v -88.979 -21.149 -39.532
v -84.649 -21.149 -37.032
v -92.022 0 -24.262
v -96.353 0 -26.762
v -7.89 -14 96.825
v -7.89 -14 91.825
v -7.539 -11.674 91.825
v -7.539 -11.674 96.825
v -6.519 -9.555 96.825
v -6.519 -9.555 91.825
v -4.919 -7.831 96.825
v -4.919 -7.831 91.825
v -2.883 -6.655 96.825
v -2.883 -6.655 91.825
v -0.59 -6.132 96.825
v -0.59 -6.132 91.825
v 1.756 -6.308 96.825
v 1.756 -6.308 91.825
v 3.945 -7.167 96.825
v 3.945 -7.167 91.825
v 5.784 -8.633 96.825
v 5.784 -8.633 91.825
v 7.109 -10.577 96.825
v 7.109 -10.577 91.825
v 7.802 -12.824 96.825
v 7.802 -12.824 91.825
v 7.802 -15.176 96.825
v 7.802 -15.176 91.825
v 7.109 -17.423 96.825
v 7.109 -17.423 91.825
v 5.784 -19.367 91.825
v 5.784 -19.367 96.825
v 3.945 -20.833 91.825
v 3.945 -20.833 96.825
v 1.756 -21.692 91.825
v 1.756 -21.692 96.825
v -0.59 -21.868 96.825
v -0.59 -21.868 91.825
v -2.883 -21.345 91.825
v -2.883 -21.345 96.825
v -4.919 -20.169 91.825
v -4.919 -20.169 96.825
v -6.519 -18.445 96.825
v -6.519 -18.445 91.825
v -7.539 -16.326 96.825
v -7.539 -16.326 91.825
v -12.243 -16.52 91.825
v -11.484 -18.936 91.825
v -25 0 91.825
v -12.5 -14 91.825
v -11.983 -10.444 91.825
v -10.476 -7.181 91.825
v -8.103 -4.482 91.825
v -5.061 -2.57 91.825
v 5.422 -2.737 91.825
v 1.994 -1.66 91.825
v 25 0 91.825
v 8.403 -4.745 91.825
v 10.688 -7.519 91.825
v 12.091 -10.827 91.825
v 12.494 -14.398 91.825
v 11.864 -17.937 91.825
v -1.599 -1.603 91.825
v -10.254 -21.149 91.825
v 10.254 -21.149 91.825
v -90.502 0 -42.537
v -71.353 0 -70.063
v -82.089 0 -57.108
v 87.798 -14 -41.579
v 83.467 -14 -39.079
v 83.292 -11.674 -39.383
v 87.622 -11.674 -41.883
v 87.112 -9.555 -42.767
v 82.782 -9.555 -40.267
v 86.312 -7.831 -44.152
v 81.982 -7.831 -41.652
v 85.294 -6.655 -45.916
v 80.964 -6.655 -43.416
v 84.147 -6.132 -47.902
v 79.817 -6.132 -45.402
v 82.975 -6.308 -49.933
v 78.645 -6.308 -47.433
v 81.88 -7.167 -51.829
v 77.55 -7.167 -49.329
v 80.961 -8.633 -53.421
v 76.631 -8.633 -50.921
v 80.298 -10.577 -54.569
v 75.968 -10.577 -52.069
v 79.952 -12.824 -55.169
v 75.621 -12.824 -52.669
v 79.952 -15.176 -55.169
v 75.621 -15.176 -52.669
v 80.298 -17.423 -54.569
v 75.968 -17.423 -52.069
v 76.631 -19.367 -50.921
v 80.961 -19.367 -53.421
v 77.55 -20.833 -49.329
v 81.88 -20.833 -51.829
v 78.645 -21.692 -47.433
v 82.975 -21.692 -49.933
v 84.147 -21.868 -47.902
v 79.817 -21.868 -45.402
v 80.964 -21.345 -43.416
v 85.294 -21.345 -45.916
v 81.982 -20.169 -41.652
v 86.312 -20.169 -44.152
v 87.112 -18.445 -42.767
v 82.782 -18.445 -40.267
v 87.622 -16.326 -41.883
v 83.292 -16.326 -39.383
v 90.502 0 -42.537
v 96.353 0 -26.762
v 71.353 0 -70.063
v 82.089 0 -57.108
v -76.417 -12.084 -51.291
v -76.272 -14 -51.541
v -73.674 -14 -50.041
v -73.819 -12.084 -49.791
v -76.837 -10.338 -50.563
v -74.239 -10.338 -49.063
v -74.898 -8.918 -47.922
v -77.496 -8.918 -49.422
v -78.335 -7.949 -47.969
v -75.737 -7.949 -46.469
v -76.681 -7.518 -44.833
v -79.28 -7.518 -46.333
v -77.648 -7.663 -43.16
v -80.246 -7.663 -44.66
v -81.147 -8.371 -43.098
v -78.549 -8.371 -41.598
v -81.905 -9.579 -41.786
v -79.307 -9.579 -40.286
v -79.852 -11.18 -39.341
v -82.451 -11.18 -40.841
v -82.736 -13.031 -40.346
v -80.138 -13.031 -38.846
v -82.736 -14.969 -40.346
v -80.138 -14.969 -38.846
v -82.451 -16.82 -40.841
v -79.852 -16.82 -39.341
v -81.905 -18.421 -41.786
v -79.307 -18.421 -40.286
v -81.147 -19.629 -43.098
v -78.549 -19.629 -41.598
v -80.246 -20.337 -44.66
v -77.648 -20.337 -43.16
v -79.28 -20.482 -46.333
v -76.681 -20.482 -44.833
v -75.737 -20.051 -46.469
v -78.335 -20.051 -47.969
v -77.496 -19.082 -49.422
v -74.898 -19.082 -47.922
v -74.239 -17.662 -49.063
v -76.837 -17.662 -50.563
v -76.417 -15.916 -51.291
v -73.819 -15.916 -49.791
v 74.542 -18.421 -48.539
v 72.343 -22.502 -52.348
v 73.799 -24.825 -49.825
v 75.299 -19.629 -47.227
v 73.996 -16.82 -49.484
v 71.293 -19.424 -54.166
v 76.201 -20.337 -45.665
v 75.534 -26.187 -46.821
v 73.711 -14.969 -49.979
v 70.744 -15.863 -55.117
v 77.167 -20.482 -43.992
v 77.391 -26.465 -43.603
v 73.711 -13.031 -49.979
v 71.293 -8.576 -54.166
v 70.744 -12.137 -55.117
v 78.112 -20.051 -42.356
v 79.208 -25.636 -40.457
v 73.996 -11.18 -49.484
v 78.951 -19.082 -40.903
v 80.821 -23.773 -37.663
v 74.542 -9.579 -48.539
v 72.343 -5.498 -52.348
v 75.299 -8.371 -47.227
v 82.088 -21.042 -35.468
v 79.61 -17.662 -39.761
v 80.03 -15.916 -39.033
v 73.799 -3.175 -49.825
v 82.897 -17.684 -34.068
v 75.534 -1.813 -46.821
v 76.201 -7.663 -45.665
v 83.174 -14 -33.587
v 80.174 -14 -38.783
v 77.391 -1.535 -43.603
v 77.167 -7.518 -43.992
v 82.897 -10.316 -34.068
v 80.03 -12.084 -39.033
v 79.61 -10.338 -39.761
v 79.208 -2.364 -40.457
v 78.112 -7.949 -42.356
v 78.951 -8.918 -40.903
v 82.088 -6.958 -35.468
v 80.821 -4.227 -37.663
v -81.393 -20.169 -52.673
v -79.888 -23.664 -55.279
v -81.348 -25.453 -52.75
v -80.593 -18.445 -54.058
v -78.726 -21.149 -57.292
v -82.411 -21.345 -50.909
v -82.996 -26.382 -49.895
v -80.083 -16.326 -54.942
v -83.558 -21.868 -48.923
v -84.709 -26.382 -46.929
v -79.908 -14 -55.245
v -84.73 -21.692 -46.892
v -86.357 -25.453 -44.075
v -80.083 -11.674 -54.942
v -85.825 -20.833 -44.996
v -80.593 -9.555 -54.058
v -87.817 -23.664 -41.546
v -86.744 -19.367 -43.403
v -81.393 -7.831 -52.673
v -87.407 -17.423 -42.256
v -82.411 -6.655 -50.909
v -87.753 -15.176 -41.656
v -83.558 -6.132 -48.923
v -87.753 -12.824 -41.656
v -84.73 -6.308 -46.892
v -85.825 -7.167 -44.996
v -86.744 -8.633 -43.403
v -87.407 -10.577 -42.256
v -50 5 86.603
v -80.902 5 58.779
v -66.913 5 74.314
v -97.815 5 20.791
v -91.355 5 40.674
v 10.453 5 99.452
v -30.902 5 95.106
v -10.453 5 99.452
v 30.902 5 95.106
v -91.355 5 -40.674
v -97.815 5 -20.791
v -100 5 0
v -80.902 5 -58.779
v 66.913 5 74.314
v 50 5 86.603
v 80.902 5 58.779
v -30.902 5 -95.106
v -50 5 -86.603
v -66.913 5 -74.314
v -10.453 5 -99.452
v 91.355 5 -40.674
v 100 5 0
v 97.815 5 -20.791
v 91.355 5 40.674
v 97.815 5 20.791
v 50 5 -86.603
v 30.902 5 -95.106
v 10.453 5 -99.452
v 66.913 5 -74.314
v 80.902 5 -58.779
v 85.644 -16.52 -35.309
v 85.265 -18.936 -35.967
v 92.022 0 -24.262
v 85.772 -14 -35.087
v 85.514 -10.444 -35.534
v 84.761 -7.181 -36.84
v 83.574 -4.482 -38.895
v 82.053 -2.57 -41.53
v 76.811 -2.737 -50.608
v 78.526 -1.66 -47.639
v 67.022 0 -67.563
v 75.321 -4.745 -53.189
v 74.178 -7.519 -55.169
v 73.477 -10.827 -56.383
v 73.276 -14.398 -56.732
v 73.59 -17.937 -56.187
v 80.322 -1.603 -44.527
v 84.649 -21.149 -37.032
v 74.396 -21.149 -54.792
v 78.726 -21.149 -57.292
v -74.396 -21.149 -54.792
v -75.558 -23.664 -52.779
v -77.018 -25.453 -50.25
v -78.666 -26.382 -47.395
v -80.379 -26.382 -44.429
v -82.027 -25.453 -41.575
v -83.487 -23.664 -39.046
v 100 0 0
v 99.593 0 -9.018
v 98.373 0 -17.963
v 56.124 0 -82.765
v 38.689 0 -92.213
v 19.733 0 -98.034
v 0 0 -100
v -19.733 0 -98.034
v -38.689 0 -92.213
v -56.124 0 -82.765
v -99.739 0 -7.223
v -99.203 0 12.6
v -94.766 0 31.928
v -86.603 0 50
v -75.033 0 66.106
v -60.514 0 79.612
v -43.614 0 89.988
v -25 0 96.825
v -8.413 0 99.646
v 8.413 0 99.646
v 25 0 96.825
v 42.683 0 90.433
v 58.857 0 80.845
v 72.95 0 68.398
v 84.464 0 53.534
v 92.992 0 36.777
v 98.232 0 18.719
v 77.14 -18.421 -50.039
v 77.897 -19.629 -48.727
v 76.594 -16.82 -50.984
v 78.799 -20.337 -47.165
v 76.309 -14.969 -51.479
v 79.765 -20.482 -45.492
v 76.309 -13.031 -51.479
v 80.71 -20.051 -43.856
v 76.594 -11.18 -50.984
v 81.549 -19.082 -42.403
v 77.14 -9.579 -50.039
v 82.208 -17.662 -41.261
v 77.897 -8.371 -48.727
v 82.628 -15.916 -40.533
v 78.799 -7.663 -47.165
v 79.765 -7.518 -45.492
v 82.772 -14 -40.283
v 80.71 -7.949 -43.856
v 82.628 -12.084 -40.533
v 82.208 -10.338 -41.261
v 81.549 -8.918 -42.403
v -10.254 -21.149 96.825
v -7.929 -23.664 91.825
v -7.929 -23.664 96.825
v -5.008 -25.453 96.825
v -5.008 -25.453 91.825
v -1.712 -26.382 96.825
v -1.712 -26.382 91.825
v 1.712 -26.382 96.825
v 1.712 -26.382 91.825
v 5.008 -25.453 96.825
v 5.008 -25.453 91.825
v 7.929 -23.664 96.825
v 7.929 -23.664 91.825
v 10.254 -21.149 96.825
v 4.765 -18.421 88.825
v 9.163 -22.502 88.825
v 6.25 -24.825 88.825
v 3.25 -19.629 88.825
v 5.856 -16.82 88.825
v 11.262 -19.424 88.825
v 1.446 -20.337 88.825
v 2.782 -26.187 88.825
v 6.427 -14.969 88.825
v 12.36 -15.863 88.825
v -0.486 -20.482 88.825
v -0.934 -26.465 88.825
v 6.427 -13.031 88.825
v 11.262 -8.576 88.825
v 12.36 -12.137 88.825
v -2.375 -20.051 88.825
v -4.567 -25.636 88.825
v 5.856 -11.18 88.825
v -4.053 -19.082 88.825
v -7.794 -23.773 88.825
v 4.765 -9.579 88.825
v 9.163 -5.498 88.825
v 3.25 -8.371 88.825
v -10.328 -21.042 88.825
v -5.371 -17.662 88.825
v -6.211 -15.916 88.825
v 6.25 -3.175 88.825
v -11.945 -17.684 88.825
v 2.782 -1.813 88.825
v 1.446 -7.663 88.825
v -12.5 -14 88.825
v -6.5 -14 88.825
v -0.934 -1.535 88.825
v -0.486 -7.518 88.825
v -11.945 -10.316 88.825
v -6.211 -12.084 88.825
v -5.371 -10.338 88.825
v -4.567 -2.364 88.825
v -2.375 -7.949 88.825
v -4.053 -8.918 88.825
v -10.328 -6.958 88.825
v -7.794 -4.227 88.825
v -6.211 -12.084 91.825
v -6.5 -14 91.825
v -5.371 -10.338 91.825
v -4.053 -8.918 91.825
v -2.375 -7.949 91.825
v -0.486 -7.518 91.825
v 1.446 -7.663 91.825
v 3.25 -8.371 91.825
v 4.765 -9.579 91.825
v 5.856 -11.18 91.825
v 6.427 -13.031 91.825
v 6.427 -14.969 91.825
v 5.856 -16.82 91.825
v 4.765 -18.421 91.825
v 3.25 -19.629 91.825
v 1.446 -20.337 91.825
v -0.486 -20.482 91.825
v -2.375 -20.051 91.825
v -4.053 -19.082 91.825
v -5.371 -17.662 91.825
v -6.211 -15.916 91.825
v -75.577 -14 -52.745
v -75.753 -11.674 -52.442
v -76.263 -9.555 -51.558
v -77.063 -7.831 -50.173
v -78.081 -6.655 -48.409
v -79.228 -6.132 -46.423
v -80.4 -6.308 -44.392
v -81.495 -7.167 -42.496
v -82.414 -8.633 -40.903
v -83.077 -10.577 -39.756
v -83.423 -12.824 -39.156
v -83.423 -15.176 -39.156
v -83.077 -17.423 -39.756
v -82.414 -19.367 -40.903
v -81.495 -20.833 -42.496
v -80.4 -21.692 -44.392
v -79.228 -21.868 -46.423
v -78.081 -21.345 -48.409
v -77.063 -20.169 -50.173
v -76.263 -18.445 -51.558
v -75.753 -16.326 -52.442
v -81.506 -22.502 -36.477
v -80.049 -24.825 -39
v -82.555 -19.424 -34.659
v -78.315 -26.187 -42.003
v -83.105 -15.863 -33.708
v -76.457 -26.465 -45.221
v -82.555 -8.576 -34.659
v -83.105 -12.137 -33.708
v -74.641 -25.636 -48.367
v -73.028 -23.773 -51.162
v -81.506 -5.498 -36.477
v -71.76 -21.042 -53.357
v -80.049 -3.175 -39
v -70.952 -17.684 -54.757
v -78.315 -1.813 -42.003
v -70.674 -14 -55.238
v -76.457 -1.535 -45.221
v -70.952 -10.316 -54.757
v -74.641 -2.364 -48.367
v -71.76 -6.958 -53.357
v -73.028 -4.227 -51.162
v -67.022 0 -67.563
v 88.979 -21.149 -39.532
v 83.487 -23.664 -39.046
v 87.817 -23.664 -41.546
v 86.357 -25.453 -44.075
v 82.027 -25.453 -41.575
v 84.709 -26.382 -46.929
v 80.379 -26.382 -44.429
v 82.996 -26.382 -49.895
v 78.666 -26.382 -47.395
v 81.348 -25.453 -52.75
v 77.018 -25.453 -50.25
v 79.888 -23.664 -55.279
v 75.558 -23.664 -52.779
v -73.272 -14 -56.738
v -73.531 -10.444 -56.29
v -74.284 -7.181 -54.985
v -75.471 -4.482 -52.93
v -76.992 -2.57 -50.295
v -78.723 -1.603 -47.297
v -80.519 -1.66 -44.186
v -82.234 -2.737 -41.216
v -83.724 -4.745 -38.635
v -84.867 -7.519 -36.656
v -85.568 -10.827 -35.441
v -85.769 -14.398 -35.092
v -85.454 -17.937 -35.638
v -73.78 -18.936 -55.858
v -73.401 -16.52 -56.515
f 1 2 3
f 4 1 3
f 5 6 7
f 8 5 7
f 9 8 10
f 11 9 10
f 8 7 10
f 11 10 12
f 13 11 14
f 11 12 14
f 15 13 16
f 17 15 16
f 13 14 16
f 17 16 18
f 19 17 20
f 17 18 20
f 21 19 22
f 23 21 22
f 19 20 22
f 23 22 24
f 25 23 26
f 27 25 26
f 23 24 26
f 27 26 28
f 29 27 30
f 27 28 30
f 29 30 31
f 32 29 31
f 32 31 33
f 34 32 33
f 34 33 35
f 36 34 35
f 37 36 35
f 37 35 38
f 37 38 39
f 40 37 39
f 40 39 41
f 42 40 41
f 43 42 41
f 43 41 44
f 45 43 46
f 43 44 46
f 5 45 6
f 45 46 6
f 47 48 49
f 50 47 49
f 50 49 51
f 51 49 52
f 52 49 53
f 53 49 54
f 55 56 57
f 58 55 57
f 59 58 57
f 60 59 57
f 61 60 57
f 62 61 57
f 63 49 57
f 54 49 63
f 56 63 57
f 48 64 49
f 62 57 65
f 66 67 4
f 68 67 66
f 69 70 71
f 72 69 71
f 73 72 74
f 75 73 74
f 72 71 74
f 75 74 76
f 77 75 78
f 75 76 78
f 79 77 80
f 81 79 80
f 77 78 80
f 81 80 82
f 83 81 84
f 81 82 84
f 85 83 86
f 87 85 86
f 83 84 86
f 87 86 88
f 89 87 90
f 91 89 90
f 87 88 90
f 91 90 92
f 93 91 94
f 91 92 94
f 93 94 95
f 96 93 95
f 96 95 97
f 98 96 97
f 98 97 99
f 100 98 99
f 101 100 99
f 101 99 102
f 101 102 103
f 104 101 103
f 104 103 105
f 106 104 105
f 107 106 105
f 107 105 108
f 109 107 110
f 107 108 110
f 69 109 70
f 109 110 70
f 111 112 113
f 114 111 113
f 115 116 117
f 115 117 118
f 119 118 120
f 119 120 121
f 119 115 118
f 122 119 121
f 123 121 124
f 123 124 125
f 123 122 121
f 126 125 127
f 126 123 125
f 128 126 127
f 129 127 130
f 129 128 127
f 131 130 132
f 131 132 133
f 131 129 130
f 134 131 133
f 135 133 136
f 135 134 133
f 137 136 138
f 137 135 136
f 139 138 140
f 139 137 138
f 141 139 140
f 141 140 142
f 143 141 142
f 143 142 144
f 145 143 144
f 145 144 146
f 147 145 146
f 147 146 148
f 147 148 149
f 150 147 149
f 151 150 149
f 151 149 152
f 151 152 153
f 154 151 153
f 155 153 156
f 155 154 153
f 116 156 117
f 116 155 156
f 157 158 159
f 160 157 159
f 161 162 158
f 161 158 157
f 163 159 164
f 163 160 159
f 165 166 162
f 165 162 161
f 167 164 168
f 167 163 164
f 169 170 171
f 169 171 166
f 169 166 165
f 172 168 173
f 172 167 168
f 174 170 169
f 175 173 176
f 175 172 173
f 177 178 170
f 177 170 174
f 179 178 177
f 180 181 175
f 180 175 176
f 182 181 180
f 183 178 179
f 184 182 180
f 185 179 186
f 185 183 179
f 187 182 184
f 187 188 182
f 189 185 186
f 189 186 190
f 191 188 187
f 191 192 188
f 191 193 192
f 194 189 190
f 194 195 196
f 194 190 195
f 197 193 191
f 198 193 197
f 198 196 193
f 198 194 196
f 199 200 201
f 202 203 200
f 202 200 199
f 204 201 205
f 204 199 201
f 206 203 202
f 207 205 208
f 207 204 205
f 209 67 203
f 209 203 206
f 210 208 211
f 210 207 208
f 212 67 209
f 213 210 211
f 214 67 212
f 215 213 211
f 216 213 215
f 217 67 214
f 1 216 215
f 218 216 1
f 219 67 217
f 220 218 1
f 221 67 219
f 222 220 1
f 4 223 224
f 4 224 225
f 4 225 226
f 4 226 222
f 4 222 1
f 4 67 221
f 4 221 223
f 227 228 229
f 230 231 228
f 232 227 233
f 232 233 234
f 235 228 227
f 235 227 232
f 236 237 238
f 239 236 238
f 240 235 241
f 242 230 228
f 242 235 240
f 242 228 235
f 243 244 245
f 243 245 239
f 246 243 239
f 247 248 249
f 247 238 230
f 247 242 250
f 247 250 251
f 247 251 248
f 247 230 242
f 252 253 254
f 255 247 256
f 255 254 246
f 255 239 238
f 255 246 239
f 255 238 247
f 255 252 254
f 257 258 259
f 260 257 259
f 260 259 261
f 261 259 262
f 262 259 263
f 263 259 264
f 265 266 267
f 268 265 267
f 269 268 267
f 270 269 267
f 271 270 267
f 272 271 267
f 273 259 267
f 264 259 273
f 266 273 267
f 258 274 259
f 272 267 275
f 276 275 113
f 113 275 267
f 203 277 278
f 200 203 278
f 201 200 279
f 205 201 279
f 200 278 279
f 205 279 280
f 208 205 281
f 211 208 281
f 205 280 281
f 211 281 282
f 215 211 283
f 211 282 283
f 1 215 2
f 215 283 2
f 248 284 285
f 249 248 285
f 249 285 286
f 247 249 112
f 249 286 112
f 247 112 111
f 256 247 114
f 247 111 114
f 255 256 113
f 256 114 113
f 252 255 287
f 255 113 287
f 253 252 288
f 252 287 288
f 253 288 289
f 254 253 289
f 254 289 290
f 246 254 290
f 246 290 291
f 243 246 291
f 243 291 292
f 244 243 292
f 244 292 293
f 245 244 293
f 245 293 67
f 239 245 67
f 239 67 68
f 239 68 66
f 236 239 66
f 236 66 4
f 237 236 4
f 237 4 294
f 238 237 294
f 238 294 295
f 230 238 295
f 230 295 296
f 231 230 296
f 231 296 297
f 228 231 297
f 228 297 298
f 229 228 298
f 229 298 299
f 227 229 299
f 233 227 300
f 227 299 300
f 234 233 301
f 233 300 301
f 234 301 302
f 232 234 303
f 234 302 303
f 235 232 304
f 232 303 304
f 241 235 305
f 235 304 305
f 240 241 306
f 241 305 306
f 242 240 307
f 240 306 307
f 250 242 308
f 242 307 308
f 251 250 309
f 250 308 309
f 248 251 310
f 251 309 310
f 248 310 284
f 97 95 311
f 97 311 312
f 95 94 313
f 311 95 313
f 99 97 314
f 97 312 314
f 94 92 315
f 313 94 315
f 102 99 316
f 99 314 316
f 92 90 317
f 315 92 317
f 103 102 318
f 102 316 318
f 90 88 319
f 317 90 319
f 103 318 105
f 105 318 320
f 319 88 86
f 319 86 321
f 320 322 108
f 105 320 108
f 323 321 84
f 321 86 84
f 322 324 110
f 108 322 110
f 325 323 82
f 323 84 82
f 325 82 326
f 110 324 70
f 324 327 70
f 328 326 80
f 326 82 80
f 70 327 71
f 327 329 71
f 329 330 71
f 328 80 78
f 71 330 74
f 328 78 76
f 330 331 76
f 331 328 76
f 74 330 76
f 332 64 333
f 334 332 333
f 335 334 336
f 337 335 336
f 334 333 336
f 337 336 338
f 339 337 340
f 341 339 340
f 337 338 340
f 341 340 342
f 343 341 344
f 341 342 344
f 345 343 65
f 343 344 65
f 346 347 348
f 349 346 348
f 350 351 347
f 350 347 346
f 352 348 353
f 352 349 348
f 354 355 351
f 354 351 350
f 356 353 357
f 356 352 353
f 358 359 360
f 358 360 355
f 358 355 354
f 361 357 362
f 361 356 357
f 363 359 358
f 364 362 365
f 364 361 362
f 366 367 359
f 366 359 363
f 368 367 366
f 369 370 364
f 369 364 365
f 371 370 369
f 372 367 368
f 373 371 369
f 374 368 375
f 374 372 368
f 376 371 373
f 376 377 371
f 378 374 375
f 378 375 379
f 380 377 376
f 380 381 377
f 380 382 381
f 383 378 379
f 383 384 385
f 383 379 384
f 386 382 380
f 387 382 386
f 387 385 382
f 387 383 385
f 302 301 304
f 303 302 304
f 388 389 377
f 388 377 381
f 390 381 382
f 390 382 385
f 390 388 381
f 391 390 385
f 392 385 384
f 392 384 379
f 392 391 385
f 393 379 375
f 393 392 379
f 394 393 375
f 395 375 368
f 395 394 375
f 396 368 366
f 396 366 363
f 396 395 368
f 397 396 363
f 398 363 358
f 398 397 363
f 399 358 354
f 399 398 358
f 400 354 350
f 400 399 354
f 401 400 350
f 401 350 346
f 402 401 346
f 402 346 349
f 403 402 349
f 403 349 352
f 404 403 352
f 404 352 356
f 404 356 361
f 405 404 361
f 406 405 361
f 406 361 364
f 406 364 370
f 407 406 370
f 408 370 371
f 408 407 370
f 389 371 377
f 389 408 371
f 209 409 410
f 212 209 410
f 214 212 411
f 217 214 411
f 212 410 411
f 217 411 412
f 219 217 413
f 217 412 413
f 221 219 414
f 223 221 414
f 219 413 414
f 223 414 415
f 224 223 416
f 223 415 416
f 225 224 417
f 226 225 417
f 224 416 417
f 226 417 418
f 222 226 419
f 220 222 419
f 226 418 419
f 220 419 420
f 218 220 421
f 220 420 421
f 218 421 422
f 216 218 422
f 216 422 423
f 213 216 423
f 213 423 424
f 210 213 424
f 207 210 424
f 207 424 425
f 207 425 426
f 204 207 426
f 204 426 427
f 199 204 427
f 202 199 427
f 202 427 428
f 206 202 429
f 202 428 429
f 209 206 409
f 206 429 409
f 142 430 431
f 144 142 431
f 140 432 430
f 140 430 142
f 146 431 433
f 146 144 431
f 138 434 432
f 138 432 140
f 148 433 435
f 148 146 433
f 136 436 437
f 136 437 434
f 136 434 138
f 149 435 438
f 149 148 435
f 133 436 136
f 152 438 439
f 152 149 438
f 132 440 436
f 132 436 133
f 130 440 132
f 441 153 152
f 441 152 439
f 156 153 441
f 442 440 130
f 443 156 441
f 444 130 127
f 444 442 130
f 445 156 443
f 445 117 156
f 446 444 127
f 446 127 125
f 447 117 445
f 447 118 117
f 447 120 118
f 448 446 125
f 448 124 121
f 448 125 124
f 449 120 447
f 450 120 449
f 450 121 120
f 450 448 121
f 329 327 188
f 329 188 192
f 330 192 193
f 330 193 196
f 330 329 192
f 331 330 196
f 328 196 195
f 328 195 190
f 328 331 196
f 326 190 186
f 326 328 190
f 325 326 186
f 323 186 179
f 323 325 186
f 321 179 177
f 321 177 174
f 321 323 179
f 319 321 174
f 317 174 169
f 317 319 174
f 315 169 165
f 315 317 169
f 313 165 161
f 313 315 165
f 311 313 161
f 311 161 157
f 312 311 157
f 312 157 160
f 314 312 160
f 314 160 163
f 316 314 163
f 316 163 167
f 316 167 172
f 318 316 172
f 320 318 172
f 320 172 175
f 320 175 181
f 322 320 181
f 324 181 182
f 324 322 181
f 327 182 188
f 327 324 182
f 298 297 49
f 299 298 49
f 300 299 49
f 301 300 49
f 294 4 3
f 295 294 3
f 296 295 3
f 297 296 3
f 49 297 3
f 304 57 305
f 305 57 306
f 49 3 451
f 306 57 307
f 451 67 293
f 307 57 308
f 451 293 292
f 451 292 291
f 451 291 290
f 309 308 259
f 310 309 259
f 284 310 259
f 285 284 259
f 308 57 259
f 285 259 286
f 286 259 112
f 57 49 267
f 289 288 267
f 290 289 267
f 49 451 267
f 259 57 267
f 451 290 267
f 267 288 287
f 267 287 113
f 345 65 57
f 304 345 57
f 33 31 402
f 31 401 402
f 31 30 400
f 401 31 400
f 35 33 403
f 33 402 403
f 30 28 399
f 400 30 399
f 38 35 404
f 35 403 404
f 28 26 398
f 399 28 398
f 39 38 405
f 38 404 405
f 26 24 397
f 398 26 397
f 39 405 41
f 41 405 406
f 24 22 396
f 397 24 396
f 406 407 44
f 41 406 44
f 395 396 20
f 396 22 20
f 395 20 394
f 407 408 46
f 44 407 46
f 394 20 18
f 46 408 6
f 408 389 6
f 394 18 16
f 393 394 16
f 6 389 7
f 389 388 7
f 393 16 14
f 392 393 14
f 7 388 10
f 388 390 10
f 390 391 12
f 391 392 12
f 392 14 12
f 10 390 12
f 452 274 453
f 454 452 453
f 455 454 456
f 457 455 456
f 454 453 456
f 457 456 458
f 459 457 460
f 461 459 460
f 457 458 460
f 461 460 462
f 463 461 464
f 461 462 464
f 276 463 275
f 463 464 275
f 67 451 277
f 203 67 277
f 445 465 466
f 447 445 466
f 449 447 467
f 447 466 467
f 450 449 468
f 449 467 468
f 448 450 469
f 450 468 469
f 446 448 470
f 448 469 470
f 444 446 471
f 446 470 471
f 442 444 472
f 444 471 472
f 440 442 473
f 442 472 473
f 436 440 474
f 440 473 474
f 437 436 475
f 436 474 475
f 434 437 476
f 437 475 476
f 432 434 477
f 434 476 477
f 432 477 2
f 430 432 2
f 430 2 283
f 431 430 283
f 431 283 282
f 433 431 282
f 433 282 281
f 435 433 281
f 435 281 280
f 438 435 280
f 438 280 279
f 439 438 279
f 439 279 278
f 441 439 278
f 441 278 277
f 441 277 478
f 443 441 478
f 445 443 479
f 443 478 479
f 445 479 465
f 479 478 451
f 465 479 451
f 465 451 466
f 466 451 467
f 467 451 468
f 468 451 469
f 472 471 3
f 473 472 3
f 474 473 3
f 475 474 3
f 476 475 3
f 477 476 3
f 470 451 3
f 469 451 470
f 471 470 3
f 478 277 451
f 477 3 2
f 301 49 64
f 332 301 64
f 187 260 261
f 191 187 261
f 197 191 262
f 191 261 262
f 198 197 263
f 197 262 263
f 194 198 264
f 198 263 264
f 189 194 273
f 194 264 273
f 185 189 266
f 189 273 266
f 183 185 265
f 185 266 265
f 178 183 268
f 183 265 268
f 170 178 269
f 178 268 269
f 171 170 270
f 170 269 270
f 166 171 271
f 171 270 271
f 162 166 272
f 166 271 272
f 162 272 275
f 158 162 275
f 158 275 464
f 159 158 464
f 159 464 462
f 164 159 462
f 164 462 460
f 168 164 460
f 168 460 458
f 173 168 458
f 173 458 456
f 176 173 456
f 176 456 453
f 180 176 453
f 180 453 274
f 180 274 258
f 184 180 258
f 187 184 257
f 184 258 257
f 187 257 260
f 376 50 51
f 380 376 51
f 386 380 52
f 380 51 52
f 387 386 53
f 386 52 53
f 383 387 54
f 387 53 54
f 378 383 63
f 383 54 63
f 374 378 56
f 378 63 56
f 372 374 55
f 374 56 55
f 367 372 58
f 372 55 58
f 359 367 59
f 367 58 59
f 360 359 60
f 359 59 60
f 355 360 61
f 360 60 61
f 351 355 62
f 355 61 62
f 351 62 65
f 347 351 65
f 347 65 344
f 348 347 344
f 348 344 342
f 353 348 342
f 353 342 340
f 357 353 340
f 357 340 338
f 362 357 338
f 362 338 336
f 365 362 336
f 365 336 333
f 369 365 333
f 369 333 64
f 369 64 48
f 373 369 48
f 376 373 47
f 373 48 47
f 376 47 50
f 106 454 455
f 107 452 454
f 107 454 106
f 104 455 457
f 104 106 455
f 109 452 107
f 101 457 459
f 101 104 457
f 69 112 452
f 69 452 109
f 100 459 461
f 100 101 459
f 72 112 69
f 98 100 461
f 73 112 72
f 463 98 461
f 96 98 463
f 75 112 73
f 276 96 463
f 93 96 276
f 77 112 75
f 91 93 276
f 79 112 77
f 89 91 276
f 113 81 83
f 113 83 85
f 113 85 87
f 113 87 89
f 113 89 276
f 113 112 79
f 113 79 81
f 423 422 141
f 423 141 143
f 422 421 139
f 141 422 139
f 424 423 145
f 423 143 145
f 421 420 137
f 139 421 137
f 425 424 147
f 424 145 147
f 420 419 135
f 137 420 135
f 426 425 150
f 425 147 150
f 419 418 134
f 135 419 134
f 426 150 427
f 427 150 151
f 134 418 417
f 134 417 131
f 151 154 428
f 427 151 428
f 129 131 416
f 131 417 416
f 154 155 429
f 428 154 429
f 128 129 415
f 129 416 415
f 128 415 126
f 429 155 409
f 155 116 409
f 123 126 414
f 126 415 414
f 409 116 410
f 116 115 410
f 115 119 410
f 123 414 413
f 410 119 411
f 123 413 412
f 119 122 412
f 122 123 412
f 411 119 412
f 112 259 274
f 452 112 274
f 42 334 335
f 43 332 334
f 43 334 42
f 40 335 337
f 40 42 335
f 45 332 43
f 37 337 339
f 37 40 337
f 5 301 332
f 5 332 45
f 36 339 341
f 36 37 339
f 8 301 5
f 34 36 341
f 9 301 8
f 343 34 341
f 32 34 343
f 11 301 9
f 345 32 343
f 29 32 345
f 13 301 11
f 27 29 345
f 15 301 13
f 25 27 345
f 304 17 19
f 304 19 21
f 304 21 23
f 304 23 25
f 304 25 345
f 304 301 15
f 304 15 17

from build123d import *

# Parameters (mm, degrees)
SKETCH1_R           = 100
BOSS_EXTRUDE2_DEPTH = 5
SKETCH4_W           = 50
SKETCH4_H           = 5
BOSS_EXTRUDE4_DEPTH = 30
SKETCH6_R           = 7.89
CUT_EXTRUDE1_DEPTH  = 5
CIRPATTERN2_COUNT   = 3
SKETCH8_R           = 12.5
SKETCH8_R_2         = 6.5
BOSS_EXTRUDE5_DEPTH = 3
CIRPATTERN3_COUNT   = 3


with BuildPart() as part:
    # Sketch1 → Boss-Extrude2 (new body)
    with BuildSketch(Plane(origin=(0, 0, 0), x_dir=(1, 0, 0), z_dir=(0, 1, 0))):
        Circle(SKETCH1_R)
    extrude(amount=BOSS_EXTRUDE2_DEPTH)

    # Sketch4 → Boss-Extrude4 (add)
    with BuildSketch(Plane.XZ):
        with Locations((0, 94.324583655)):
            Rectangle(SKETCH4_W, SKETCH4_H)
    boss_extrude4 = extrude(amount=BOSS_EXTRUDE4_DEPTH)

    # Sketch6 → Cut-Extrude1 (cut)
    with BuildSketch(Plane(origin=(0, 0, 91.824583655), x_dir=(-1, 0, 0), z_dir=(0, 0, -1))):
        with Locations((0, -14)):
            Circle(SKETCH6_R)
        with BuildLine():
            Line((25, 0), (10.253630426, -21.149340046))
            ThreePointArc((10.253630426, -21.149340046), (0, -26.5), (-10.253630426, -21.149340046))
            Line((-10.253630426, -21.149340046), (-25, 0))
            Line((-25, 0), (-25, -30.813240721))
            Line((-25, -30.813240721), (25, -30.813240721))
            Line((25, -30.813240721), (25, 0))
        make_face()
    cut_extrude1 = extrude(amount=-CUT_EXTRUDE1_DEPTH, mode=Mode.SUBTRACT)

    # CirPattern2: Boss-Extrude4, Cut-Extrude1 ×3 about axis
    cirpattern2_axis = Axis((0, 0, 0), (0, 1, 0))
    for i in range(1, CIRPATTERN2_COUNT):
        add(boss_extrude4.rotate(cirpattern2_axis, i * 360 / CIRPATTERN2_COUNT))
        add(cut_extrude1.rotate(cirpattern2_axis, i * 360 / CIRPATTERN2_COUNT), mode=Mode.SUBTRACT)

    # Sketch8 → Boss-Extrude5 (add)
    with BuildSketch(Plane(origin=(0, 0, 91.824583655), x_dir=(-1, 0, 0), z_dir=(0, 0, -1))):
        with Locations((0, -14)):
            Circle(SKETCH8_R)
        with Locations((0, -14)):
            Circle(SKETCH8_R_2, mode=Mode.SUBTRACT)
    boss_extrude5 = extrude(amount=BOSS_EXTRUDE5_DEPTH)

    # CirPattern3: Boss-Extrude5 ×3 about axis
    cirpattern3_axis = Axis((0, 0, 0), (0, 1, 0))
    for i in range(1, CIRPATTERN3_COUNT):
        add(boss_extrude5.rotate(cirpattern3_axis, i * 360 / CIRPATTERN3_COUNT))


solid = part.part
